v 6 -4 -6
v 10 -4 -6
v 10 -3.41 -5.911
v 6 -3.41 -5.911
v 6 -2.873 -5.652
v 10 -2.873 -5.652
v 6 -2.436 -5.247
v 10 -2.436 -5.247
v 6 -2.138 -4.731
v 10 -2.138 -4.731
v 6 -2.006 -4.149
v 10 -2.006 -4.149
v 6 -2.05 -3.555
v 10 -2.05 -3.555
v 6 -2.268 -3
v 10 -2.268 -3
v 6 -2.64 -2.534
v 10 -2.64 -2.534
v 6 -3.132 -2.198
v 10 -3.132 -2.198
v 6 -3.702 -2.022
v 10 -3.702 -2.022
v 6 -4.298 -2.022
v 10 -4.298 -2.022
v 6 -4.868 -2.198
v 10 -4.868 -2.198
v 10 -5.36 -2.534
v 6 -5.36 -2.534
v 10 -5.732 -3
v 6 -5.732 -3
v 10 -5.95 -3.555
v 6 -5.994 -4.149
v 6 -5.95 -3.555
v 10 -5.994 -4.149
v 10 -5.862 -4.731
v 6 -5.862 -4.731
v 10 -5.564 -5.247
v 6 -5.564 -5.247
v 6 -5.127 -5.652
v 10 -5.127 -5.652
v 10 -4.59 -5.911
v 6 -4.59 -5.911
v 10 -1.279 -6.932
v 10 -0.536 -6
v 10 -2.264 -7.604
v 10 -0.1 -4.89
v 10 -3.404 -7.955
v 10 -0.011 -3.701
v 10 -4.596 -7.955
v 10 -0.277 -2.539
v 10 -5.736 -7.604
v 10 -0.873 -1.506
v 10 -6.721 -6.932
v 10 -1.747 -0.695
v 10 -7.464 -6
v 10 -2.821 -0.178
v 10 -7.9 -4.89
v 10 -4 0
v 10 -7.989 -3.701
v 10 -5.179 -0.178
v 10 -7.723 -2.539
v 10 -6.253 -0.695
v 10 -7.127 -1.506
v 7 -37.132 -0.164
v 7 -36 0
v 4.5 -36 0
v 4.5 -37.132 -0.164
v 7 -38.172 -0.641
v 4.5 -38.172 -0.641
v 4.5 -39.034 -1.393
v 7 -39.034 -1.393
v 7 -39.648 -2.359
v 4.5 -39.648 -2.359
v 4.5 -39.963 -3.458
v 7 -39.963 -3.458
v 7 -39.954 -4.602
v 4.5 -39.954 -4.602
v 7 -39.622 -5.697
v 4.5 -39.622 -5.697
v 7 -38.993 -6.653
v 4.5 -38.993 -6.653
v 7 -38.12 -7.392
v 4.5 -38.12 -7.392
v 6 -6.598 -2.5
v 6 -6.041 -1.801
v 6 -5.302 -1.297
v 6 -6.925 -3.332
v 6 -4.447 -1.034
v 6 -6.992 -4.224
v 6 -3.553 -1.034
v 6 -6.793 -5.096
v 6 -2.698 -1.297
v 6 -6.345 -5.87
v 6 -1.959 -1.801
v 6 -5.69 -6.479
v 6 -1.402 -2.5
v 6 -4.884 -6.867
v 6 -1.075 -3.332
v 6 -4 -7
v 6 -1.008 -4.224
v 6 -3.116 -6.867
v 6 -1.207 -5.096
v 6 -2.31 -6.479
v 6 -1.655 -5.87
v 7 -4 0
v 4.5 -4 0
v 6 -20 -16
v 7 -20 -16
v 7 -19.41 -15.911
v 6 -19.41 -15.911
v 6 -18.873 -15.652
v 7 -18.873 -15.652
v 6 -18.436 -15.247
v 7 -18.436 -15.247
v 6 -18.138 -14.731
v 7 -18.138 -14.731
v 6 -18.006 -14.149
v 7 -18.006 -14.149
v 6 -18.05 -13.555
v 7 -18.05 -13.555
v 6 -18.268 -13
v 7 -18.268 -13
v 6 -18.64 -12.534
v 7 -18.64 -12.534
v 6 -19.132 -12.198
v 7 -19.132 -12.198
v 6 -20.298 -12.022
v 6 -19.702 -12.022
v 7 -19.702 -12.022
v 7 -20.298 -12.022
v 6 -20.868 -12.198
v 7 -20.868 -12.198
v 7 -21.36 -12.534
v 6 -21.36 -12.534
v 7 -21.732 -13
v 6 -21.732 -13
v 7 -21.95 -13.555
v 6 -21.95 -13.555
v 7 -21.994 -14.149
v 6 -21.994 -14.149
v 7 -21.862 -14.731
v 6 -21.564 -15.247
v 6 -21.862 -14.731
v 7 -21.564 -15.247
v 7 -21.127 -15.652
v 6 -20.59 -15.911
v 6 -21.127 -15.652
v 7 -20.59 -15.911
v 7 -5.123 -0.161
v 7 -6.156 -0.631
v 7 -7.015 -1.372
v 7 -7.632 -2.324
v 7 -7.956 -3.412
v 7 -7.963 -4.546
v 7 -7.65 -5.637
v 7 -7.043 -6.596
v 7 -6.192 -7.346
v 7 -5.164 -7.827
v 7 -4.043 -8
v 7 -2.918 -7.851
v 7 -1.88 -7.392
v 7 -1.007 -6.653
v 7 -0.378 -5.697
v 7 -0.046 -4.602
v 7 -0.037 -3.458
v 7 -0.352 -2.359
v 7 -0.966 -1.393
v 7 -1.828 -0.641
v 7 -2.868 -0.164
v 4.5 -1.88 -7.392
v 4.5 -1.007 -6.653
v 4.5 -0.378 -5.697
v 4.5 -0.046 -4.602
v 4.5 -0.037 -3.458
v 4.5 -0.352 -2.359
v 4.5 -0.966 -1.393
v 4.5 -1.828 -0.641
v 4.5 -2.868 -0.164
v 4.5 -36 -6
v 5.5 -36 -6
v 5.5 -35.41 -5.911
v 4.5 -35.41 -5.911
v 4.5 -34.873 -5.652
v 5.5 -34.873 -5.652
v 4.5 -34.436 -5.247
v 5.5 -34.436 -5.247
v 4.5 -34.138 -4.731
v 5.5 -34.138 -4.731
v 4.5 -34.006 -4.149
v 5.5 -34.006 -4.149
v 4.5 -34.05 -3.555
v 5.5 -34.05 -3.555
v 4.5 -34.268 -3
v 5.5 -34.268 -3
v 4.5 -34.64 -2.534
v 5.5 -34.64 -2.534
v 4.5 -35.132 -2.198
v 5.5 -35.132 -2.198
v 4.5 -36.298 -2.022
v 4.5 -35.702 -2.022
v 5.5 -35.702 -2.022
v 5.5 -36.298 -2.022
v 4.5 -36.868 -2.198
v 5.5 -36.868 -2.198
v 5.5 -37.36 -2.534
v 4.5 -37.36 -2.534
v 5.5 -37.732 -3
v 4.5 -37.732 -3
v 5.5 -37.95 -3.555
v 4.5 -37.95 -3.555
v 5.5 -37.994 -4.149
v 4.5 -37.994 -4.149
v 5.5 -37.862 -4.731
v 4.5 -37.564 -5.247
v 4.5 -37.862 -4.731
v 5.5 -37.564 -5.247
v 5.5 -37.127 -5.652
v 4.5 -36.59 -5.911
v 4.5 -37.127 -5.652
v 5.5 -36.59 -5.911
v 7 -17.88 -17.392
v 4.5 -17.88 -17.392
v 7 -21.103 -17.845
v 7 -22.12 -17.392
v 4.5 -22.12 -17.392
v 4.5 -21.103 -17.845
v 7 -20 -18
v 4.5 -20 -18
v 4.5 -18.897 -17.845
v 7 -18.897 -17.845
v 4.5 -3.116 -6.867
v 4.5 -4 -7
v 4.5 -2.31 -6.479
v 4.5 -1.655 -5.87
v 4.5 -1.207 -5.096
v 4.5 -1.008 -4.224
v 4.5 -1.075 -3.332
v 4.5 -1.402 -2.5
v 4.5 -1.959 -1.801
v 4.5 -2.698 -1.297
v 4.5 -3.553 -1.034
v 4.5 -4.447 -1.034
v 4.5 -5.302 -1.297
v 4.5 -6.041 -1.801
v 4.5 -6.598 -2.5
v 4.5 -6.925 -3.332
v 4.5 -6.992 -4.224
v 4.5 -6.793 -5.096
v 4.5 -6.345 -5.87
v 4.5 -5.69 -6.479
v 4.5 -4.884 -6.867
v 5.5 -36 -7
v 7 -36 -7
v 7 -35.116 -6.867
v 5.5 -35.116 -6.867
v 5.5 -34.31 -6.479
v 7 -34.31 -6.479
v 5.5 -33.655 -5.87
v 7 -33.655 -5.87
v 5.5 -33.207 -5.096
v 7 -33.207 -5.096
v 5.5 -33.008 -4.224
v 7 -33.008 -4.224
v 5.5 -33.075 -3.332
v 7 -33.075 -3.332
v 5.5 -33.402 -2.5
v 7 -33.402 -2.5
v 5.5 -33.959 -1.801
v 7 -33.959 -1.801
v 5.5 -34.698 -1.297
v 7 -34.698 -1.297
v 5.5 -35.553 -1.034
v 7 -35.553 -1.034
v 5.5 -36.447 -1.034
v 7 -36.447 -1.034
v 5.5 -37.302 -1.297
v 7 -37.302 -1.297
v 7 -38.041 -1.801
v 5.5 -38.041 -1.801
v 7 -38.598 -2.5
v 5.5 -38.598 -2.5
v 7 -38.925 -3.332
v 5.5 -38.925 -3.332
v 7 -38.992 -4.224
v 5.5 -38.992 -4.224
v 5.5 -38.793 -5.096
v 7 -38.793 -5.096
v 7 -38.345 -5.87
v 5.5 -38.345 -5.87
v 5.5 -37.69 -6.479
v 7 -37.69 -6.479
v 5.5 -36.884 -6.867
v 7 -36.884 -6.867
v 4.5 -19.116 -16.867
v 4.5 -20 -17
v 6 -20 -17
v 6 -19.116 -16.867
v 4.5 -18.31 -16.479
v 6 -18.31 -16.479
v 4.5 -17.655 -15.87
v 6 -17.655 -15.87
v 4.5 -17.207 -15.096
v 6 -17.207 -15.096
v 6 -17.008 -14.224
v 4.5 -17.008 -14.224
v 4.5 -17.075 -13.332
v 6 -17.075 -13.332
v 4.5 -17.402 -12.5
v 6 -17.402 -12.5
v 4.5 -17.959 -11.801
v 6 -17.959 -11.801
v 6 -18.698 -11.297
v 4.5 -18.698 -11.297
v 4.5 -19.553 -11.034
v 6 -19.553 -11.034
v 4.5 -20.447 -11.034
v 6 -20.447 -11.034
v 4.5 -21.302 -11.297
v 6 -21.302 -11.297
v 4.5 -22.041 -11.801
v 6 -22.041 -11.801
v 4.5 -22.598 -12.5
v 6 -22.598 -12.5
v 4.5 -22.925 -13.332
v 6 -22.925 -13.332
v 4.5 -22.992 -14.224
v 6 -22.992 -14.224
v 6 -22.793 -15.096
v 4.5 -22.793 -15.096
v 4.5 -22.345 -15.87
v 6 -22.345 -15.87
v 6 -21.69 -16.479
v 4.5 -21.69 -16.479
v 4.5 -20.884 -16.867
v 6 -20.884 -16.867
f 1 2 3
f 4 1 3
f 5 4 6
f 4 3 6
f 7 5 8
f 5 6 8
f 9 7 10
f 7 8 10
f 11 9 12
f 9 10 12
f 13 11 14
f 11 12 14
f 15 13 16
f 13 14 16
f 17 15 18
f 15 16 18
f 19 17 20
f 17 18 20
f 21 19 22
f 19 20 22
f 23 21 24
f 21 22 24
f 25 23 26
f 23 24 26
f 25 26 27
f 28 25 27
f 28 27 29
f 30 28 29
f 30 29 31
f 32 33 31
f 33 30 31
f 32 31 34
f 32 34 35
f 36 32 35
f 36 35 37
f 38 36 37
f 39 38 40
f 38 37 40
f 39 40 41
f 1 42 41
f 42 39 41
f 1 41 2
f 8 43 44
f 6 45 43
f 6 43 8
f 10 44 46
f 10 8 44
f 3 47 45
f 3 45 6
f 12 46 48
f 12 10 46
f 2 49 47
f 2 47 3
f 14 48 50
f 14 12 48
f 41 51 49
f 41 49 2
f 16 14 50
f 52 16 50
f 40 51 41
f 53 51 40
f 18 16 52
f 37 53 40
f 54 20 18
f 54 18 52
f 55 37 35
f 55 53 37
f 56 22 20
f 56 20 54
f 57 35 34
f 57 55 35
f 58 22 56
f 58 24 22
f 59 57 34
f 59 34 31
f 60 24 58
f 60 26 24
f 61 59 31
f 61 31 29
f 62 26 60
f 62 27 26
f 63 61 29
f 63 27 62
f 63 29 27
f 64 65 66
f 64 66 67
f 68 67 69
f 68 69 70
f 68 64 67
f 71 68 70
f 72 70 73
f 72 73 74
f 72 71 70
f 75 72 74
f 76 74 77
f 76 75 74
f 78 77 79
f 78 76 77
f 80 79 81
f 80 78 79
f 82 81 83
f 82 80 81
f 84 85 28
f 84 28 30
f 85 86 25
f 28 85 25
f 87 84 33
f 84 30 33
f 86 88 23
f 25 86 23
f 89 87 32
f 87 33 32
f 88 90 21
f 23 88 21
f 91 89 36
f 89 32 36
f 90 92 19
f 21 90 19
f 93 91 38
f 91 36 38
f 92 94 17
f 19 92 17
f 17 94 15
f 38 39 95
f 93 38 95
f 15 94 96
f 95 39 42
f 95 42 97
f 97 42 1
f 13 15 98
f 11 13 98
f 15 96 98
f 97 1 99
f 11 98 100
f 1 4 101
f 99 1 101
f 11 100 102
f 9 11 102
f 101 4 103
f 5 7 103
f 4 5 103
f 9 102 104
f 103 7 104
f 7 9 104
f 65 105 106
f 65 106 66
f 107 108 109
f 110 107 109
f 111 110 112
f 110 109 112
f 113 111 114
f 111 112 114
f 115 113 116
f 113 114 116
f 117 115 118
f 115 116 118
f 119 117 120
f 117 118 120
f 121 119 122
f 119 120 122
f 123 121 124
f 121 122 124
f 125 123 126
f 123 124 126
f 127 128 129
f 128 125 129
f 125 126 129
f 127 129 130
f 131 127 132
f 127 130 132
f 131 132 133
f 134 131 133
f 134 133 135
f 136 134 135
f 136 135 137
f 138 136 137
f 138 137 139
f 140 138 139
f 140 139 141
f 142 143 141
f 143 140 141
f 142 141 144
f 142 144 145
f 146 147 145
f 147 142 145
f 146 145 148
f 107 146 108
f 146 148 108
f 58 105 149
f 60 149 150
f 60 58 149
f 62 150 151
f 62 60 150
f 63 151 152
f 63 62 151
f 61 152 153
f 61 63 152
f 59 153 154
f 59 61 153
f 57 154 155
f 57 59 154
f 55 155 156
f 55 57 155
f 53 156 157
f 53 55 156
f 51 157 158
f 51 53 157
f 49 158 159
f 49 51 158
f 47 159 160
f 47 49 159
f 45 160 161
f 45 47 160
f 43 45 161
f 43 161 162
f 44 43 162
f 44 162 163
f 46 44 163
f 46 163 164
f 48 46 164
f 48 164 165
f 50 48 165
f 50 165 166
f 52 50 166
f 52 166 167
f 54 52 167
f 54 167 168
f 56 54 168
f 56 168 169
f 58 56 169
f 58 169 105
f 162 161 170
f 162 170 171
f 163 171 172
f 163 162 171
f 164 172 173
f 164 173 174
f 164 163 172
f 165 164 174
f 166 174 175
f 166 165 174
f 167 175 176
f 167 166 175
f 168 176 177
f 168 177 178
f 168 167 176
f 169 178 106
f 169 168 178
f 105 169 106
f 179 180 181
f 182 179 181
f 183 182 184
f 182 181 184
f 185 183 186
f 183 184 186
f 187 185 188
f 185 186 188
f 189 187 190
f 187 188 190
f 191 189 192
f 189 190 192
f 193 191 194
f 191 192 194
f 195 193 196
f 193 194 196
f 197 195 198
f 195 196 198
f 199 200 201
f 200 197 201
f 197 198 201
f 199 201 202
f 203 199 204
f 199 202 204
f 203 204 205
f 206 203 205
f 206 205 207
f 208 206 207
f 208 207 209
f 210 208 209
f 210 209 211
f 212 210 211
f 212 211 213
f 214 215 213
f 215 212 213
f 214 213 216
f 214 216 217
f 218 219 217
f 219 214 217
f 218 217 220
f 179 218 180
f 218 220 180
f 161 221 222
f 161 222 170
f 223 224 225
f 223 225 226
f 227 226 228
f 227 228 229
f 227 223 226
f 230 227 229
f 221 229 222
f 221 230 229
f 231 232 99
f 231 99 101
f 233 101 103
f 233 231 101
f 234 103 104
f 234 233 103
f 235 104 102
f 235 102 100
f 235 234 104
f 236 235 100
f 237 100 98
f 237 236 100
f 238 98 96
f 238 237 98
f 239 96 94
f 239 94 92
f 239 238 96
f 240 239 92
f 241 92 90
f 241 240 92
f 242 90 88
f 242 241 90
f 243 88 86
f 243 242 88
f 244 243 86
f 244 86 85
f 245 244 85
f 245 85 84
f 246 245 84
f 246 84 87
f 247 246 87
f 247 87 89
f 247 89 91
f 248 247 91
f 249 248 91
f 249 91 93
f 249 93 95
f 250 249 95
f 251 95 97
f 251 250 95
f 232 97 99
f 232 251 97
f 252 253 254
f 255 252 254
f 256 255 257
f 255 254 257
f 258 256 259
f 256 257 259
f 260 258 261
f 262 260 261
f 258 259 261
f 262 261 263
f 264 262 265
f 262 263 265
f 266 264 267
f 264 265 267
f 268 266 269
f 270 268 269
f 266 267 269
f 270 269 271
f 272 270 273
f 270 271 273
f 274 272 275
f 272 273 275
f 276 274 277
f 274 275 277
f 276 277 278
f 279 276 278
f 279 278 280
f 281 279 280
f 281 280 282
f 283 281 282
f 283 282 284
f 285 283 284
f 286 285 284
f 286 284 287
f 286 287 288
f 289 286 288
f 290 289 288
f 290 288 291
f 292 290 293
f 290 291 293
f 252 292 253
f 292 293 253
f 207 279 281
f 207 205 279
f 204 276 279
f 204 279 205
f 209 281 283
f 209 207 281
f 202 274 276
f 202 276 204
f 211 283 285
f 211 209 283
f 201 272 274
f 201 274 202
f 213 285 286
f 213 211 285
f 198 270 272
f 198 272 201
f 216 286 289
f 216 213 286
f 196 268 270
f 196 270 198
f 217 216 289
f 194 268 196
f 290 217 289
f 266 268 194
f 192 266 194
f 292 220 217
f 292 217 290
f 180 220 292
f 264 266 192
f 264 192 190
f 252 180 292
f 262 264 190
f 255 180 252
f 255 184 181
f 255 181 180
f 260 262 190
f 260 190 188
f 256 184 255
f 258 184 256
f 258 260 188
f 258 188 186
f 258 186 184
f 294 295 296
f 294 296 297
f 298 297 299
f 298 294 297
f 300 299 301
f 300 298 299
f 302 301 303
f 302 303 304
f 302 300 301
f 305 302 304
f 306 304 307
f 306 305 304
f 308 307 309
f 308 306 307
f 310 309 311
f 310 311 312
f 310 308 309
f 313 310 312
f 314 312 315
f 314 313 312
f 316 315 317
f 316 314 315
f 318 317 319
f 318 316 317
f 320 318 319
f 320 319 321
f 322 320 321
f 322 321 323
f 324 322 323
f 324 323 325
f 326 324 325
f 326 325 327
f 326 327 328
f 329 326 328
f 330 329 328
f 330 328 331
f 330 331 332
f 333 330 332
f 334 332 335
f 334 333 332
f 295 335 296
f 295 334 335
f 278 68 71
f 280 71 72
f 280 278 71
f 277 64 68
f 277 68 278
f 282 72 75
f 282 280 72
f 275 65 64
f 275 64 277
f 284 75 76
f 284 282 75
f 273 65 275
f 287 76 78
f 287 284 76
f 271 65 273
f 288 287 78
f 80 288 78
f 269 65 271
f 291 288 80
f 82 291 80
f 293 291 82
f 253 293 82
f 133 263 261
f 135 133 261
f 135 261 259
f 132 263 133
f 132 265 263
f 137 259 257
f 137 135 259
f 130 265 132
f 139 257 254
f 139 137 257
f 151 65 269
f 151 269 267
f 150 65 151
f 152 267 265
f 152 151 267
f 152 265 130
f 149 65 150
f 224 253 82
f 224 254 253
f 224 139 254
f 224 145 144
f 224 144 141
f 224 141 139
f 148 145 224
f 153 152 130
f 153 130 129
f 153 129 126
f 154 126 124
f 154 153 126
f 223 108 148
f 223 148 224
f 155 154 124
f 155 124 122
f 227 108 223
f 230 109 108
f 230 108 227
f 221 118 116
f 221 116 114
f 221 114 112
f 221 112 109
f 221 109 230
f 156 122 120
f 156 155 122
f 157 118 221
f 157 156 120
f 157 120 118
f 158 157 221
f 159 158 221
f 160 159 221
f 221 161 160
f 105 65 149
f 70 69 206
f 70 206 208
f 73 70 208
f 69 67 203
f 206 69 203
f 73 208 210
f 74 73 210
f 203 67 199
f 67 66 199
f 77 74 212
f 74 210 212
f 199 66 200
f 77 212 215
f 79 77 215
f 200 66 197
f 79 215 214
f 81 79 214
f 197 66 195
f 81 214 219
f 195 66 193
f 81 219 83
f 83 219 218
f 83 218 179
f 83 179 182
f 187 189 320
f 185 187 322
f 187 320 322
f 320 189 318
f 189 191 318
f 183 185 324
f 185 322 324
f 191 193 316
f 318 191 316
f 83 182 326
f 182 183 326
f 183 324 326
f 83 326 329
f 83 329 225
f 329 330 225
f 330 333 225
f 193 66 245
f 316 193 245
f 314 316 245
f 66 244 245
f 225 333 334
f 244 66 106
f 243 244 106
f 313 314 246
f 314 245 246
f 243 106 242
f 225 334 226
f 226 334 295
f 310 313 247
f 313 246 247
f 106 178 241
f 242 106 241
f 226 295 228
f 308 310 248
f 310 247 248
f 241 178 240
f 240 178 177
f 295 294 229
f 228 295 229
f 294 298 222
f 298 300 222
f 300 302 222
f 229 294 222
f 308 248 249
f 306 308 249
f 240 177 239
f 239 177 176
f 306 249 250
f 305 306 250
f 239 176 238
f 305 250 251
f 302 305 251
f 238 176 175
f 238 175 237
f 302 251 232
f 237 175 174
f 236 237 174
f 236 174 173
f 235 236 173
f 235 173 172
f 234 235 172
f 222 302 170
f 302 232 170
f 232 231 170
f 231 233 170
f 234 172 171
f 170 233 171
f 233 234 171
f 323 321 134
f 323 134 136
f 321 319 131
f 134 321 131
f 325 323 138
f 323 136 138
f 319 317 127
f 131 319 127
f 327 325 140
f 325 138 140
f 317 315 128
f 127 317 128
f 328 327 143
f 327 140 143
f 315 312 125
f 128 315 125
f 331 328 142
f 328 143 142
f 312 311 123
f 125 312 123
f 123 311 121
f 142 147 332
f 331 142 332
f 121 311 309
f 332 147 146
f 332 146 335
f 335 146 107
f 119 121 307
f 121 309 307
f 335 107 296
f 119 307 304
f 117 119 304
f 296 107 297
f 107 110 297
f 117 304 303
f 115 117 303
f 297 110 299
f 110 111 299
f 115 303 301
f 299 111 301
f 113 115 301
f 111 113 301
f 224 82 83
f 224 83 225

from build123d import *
from build123d.topology import SkipClean

# Parameters (mm, degrees)
EXTRUDE_1_DEPTH          = 2.5
EXTRUDE_START            = -3
SKETCH_1_4_R             = 4
EXTRUDE_2_DEPTH          = 3
CUT_EXTRUDE_1_DEPTH      = 44.965895874
CUT_EXTRUDE_1_DEPTH_BACK = 44.965895874
SKETCH_1_3_R             = 2
SKETCH_2_R               = 3
CUT_EXTRUDE_2_DEPTH      = 1.5
CUT_EXTRUDE_START        = -2.5
SKETCH_2_3_R             = 3
CUT_EXTRUDE_3_DEPTH      = 1.5
SKETCH_3_W               = 7.983418506
SKETCH_3_H               = 52.149860593
CUT_EXTRUDE_4_DEPTH      = 45.988887517


with BuildPart() as part:
    # 草图1 → 凸台-拉伸1 (new body)
    with BuildSketch(Plane(origin=(0, 0, 0), x_dir=(0, 0, -1), z_dir=(1, 0, 0))):
        with BuildLine():
            Line((17.391993216, -17.88000424), (7.391993216, -1.88000424))
            ThreePointArc((7.391993216, -1.88000424), (2.897269948, -0.155005015), (0, -4))
            Line((0, -4), (0, -36))
            ThreePointArc((0, -36), (2.897269948, -39.844994985), (7.391993216, -38.11999576))
            Line((7.391993216, -38.11999576), (17.391993216, -22.11999576))
            ThreePointArc((17.391993216, -22.11999576), (18, -20), (17.391993216, -17.88000424))
        make_face()
    extrude(amount=EXTRUDE_1_DEPTH)

    # 草图1<4> → 凸台-拉伸2 (add)
    with SkipClean():  # the faces are left unmerged after this step: merging them gives an invalid solid
        with BuildSketch(Plane(origin=(0, 0, 0), x_dir=(0, 0, -1), z_dir=(1, 0, 0)).offset(EXTRUDE_START)):
            with Locations(Location((4, -4, 0), (0, 0, 180))):
                Circle(SKETCH_1_4_R)
        extrude(amount=EXTRUDE_2_DEPTH)

    # 草图1<3> → 切除-拉伸1 (cut, two sides: drawn at the far end of the back side and taken through both)
    with SkipClean():  # the faces are left unmerged after this step: merging them gives an invalid solid
        with BuildSketch(Plane(origin=(0, 0, 0), x_dir=(0, 0, -1), z_dir=(1, 0, 0)).offset(-CUT_EXTRUDE_1_DEPTH_BACK)):
            with Locations((4, -4)):
                Circle(SKETCH_1_3_R)
            with Locations((14, -20)):
                Circle(SKETCH_1_3_R)
            with Locations((4, -36)):
                Circle(SKETCH_1_3_R)
        extrude(amount=CUT_EXTRUDE_1_DEPTH + CUT_EXTRUDE_1_DEPTH_BACK, mode=Mode.SUBTRACT)

    # 草图2 → 切除-拉伸2 (cut)
    with SkipClean():  # the faces are left unmerged after this step: merging them gives an invalid solid
        with BuildSketch(Plane(origin=(2.5, 0, 0), x_dir=(0, 0, -1), z_dir=(1, 0, 0))):
            with Locations((4, -4)):
                Circle(SKETCH_2_R)
            with Locations((14, -20)):
                Circle(SKETCH_2_R)
        extrude(amount=-CUT_EXTRUDE_2_DEPTH, mode=Mode.SUBTRACT)

    # 草图2<3> → 切除-拉伸3 (cut)
    with SkipClean():  # the faces are left unmerged after this step: merging them gives an invalid solid
        with BuildSketch(Plane(origin=(2.5, 0, 0), x_dir=(0, 0, -1), z_dir=(1, 0, 0)).offset(CUT_EXTRUDE_START)):
            with Locations((4, -36)):
                Circle(SKETCH_2_3_R)
        extrude(amount=CUT_EXTRUDE_3_DEPTH, mode=Mode.SUBTRACT)


with BuildPart() as body_2:
    # 镜向2: mirrored copy
    add(part.part.mirror(Plane(origin=(3.5, 0, 0), x_dir=(0, 0, 1), z_dir=(1, 0, 0))))


with BuildPart() as part_1:
    add(part.part)

    # 草图3 → 切除-拉伸4 (cut, through all)
    with BuildSketch(Plane.XY):
        with Locations((-0.565425098, -20.529857361)):
            Rectangle(SKETCH_3_W, SKETCH_3_H)
    extrude(amount=-CUT_EXTRUDE_4_DEPTH, mode=Mode.SUBTRACT)


solid = body_2.part
